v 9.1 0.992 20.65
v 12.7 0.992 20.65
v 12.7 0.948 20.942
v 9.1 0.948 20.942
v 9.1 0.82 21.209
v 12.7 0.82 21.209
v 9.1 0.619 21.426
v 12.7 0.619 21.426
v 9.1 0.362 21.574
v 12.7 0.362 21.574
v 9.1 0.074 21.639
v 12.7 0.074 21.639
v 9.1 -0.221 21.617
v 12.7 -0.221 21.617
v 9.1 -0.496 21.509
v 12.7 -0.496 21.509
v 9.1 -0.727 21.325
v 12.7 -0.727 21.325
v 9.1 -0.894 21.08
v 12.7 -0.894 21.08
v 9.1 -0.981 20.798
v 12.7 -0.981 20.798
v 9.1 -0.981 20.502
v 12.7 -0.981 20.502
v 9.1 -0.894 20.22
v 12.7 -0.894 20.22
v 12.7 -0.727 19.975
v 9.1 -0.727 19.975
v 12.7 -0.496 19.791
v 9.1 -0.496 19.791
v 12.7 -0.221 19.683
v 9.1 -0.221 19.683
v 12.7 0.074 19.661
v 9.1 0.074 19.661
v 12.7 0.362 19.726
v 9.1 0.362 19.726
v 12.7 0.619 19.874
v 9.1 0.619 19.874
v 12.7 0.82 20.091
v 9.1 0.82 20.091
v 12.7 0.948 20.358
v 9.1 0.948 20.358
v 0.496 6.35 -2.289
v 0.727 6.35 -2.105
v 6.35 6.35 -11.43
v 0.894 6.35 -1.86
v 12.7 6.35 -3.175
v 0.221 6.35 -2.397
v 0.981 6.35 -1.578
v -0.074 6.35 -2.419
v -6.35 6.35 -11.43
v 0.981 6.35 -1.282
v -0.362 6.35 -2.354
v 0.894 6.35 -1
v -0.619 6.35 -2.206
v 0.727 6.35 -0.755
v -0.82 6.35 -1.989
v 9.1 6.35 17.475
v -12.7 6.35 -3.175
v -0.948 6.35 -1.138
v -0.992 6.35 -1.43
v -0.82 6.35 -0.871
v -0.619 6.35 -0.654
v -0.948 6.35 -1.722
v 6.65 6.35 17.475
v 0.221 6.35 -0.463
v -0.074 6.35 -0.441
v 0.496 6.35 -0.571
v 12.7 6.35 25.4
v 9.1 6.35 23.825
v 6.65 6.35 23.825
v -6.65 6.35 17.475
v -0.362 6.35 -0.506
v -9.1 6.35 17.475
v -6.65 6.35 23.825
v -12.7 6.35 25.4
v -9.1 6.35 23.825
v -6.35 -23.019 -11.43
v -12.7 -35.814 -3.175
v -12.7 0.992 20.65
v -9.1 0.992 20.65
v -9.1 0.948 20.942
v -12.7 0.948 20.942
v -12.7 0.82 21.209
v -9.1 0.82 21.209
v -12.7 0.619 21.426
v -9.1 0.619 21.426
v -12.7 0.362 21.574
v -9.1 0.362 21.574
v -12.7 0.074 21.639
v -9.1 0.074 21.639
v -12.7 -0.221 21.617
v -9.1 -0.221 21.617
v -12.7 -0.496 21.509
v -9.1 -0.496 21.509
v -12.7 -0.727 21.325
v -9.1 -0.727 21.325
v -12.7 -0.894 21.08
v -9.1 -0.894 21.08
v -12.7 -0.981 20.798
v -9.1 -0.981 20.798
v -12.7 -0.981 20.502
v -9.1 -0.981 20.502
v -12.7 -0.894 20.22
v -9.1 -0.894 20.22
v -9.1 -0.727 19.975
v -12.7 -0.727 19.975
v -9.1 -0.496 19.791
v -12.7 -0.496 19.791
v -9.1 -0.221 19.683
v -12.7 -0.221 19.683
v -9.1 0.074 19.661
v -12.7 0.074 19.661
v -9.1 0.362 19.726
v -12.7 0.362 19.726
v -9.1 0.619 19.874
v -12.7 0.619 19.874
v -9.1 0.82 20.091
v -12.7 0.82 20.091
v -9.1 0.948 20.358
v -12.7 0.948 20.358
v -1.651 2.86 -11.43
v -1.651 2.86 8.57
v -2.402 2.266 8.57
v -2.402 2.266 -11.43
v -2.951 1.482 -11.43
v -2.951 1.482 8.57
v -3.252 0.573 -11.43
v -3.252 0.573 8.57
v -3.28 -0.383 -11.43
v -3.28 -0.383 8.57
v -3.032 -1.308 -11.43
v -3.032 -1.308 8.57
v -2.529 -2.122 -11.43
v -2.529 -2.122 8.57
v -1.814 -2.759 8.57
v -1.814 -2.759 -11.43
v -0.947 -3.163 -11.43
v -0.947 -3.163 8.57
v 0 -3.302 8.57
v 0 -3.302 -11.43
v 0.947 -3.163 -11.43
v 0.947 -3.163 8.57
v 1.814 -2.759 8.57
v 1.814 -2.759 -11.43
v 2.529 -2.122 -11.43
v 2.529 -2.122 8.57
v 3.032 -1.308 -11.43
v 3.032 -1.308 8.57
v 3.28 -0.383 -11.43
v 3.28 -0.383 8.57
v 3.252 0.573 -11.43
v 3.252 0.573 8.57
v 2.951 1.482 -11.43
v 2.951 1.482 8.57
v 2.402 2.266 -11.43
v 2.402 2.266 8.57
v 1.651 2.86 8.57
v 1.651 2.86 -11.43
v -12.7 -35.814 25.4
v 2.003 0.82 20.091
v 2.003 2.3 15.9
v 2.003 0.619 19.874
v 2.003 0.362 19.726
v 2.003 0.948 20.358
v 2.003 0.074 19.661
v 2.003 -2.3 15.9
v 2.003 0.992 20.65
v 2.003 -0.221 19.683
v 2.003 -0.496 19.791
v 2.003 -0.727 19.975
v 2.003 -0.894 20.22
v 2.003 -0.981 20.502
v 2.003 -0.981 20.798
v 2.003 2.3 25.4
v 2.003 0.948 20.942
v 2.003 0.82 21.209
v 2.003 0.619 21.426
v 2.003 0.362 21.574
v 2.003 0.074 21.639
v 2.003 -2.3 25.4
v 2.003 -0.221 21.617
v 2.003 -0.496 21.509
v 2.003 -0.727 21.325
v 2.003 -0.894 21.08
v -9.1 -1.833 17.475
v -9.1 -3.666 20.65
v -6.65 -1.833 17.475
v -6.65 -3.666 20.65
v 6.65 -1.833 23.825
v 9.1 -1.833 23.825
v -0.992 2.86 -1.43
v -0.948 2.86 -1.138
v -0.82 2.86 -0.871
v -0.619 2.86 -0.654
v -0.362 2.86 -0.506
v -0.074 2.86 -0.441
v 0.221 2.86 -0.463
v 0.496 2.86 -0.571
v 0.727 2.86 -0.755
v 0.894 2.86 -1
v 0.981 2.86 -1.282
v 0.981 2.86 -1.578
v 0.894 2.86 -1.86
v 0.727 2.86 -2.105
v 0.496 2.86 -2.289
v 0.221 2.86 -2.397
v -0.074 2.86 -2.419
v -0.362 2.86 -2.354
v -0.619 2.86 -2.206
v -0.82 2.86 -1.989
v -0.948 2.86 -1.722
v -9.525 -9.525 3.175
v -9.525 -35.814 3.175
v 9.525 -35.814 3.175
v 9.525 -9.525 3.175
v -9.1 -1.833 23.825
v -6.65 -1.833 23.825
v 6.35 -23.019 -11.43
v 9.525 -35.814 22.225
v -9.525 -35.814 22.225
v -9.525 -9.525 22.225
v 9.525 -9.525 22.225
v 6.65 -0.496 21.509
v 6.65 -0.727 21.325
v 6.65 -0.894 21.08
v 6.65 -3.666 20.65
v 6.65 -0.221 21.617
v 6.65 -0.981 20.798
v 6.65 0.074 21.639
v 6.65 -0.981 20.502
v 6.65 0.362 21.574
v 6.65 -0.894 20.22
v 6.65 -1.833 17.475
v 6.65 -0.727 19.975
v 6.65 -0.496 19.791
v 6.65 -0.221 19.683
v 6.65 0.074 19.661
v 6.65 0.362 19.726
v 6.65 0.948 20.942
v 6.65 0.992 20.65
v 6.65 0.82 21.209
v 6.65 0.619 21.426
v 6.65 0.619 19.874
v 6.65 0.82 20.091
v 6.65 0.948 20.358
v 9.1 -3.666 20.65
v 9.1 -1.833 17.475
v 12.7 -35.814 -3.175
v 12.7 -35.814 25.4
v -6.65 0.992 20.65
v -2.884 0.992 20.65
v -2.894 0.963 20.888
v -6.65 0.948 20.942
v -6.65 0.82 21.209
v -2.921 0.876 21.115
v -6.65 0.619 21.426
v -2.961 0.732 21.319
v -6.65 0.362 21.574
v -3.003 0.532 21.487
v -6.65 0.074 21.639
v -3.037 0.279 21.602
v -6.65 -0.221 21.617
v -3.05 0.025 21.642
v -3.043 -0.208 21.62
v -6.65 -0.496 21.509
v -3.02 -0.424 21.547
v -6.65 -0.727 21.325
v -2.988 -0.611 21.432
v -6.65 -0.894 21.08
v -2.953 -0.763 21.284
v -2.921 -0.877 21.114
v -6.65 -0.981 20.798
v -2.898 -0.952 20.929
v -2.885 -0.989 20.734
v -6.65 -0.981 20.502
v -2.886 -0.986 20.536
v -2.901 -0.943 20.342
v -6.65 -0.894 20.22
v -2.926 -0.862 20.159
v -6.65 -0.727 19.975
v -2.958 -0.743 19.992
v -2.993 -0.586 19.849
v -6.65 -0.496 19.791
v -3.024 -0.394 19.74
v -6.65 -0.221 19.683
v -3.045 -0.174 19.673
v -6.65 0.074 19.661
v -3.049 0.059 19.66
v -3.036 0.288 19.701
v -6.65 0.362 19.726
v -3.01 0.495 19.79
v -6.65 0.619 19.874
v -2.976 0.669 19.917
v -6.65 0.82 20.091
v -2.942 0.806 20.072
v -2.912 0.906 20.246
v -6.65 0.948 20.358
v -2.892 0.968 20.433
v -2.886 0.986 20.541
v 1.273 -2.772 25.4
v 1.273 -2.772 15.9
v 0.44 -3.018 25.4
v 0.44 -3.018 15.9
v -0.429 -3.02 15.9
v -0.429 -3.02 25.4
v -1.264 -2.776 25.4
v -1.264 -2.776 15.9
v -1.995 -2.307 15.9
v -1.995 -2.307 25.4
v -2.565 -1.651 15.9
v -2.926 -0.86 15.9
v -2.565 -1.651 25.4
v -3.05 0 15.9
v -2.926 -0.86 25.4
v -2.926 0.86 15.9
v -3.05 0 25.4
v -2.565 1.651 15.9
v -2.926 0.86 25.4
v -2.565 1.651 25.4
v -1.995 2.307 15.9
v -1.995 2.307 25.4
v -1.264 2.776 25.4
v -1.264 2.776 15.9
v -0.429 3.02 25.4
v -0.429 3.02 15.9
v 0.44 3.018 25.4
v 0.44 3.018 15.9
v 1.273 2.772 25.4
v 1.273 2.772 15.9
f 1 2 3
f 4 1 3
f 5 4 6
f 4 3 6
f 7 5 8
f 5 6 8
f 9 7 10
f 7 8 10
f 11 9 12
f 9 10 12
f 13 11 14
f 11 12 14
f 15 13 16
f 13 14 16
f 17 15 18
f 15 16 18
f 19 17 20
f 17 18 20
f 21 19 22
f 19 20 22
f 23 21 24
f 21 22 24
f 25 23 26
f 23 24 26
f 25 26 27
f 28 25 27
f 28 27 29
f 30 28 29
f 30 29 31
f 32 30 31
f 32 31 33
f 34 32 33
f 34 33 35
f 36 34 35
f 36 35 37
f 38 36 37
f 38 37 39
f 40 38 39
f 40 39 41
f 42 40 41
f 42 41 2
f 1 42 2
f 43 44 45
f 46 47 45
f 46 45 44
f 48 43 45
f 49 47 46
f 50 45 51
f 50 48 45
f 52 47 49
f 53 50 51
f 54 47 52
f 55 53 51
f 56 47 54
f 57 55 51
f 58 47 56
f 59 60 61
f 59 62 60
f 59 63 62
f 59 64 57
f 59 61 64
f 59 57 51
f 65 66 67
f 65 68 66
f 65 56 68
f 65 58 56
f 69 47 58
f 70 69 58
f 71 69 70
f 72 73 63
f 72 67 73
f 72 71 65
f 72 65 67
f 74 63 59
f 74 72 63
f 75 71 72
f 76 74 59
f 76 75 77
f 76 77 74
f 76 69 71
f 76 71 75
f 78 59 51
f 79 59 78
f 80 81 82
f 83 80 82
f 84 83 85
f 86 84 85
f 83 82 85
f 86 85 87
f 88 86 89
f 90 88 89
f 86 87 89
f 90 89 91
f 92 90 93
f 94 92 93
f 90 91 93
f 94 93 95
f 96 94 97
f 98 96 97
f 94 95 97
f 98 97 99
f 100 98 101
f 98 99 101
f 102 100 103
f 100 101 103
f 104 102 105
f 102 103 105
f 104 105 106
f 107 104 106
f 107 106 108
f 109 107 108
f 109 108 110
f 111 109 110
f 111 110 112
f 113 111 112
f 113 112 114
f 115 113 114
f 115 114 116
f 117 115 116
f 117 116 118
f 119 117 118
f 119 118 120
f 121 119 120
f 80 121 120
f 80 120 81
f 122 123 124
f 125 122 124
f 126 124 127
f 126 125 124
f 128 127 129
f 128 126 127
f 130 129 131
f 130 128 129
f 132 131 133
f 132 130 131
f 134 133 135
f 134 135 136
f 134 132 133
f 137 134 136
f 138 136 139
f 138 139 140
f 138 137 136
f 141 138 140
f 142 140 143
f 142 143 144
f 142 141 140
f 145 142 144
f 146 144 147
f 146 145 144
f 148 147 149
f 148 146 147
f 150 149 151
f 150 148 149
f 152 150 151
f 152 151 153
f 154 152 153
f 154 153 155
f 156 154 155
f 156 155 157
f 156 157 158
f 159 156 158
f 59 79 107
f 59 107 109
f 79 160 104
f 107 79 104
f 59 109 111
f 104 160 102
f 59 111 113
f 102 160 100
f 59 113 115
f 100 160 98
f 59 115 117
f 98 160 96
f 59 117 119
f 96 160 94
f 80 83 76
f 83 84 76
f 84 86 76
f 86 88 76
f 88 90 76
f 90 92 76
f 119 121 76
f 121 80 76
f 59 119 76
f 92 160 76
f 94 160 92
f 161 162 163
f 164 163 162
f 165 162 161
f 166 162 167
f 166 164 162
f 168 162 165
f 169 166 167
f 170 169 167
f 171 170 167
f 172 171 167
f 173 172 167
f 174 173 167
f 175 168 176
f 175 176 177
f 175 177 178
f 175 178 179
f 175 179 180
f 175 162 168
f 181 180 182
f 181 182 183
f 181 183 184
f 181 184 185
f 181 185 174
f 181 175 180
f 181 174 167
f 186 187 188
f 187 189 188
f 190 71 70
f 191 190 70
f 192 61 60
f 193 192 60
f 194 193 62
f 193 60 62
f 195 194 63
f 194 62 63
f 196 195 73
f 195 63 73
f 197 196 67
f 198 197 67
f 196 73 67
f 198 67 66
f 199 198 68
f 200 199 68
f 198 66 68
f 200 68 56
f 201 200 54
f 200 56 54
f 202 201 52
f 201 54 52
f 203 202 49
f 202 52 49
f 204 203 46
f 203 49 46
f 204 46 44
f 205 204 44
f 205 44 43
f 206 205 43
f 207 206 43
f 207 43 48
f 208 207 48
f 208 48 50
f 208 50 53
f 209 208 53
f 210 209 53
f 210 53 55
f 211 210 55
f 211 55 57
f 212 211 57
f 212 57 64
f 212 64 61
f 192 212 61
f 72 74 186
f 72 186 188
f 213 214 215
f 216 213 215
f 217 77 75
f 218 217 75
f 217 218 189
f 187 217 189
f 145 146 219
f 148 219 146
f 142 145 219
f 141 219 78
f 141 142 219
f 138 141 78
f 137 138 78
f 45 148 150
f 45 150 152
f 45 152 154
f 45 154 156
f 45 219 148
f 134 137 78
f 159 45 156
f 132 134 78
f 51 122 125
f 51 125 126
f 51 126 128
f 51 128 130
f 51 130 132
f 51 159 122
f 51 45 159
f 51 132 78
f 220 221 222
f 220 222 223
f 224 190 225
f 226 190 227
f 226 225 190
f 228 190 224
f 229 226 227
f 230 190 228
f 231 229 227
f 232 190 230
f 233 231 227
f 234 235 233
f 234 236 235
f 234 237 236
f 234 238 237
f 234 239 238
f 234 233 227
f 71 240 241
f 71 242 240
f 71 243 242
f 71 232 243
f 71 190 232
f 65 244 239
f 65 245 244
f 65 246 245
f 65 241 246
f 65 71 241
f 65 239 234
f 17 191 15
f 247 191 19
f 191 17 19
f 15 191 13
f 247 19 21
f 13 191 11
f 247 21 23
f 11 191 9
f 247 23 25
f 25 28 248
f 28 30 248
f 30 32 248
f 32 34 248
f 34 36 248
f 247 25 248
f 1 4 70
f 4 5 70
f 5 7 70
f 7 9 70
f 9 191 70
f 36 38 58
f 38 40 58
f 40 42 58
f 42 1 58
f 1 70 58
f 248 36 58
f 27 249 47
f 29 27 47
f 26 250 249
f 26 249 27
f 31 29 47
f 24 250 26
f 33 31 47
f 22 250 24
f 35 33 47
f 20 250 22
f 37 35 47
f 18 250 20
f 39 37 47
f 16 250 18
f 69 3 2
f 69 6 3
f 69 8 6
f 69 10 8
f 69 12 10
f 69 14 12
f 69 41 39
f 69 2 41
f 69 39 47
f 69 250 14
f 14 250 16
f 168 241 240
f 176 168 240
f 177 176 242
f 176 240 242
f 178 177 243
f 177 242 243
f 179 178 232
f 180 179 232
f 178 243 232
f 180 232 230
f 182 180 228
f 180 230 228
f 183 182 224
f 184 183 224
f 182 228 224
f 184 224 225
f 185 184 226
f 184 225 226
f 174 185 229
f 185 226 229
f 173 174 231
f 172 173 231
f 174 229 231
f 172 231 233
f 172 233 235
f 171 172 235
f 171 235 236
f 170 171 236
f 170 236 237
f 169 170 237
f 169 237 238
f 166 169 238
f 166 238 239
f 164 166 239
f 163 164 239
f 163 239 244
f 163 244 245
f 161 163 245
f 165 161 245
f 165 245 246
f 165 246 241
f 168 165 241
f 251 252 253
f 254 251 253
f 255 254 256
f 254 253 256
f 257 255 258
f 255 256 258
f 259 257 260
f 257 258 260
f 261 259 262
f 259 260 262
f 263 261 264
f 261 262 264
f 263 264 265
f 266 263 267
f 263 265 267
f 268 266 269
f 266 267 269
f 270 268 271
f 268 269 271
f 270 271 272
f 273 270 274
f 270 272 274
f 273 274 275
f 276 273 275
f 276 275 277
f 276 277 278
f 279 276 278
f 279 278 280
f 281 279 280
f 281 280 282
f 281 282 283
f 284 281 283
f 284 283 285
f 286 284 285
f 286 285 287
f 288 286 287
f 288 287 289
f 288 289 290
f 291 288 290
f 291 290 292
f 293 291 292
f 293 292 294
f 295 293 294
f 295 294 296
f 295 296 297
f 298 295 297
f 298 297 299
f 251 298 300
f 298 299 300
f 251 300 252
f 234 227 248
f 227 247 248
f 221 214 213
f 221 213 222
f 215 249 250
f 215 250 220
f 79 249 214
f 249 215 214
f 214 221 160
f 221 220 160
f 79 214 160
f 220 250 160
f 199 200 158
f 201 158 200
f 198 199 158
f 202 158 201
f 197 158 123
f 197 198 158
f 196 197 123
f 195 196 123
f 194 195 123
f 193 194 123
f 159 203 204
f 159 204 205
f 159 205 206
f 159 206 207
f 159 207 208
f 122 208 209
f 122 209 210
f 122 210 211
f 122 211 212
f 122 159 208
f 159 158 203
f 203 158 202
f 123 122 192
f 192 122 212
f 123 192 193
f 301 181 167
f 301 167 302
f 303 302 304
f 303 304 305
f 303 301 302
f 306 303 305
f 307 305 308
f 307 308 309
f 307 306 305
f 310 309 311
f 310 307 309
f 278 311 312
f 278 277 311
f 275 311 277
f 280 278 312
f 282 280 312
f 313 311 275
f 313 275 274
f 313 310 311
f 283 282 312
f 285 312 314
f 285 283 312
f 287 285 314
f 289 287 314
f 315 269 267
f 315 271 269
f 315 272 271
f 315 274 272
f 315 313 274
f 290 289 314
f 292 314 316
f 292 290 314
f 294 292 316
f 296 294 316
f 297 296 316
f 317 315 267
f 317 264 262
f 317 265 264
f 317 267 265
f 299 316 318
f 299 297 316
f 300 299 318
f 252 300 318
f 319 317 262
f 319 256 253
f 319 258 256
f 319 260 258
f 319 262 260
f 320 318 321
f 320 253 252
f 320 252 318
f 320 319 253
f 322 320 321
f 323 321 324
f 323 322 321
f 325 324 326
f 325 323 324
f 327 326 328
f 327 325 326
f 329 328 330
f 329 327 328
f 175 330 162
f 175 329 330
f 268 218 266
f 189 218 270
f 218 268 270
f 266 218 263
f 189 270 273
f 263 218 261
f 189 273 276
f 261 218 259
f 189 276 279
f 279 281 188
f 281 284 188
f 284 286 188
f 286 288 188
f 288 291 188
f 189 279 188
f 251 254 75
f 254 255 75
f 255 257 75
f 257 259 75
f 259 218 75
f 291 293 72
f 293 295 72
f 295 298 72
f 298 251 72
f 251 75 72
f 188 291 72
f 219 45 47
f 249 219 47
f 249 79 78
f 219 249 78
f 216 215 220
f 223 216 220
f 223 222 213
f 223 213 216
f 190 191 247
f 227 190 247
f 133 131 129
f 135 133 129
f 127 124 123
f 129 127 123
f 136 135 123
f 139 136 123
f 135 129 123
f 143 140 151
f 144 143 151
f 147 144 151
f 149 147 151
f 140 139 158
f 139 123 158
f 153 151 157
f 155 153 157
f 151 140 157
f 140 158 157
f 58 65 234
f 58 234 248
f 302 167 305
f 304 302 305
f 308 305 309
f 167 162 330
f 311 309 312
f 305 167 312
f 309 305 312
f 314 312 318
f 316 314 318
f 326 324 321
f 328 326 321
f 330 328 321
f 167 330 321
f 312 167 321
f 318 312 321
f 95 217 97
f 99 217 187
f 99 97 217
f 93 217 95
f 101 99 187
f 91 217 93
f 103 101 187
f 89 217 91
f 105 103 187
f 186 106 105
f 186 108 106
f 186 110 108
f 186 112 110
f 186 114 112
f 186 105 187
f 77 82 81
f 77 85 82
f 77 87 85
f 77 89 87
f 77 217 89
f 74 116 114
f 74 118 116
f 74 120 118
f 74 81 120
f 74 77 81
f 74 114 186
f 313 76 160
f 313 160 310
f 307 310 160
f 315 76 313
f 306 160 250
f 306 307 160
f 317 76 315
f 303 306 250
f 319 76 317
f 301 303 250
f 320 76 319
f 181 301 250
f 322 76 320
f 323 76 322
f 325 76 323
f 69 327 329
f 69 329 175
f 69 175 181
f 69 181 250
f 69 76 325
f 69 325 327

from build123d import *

# Parameters (mm, degrees)
BOSS_EXTRUDE1_DEPTH = 25.4
CUT_EXTRUDE1_DEPTH  = 9.5
SKETCH5_W           = 25.4
SKETCH5_H           = 42.164
BOSS_EXTRUDE2_DEPTH = 11.43
CUT_EXTRUDE2_REACH  = 53.538
CUT_EXTRUDE3_REACH  = 53.255
CUT_EXTRUDE4_DEPTH  = 20
SKETCH10_W          = 19.05
SKETCH10_H          = 19.05
CUT_EXTRUDE5_DEPTH  = 26.289
CUT_EXTRUDE6_REACH  = 55.322
SKETCH11_W          = 1.5875
SKETCH11_H          = 12.7
SKETCH12_R          = 0.9921875
CUT_EXTRUDE7_DEPTH  = 51.724378715
CUT_EXTRUDE8_REACH  = 52.836
SKETCH13_R          = 0.9921875
CUT_EXTRUDE9_START  = -7.875
CUT_EXTRUDE9_DEPTH  = 1.225
CUT_EXTRUDE10_START = 7.875
CUT_EXTRUDE10_DEPTH = 1.225
CUT_EXTRUDE11_REACH = 52.836
SKETCH15_W          = 2.45
SKETCH15_H          = 6.35


with BuildPart() as part:
    # Sketch2 → Boss-Extrude1 (new body)
    with BuildSketch(Plane.XY):
        Polygon((12.7, -6.35), (14.2875, -6.35), (14.2875, 6.35), (-14.2875, 6.35), (-14.2875, -6.35), (-12.7, -6.35), (-12.7, -35.814), (12.7, -35.814), align=None)
    extrude(amount=BOSS_EXTRUDE1_DEPTH)

    # Sketch3 → Cut-Extrude1 (cut)
    with BuildSketch(Plane.XY.offset(25.4)):
        with BuildLine():
            Line((2.003122562, 2.3), (2.003122562, -2.3))
            ThreePointArc((2.003122562, -2.3), (-3.05, 0), (2.003122562, 2.3))
        make_face()
    extrude(amount=-CUT_EXTRUDE1_DEPTH, mode=Mode.SUBTRACT)

    # Sketch5 → Boss-Extrude2 (add)
    with BuildSketch(Plane(origin=(0, 0, 0), x_dir=(-1, 0, 0), z_dir=(0, 0, -1))):
        with Locations((0, -14.732)):
            Rectangle(SKETCH5_W, SKETCH5_H)
    extrude(amount=BOSS_EXTRUDE2_DEPTH)

    # Sketch6 → Cut-Extrude2 (cut, up to next)
    with BuildSketch(Plane(origin=(12.7, 0, 0), x_dir=(0, 0, -1), z_dir=(1, 0, 0)), mode=Mode.PRIVATE) as cut_extrude2_sk1:
        Polygon((3.175, -35.814), (11.43, -23.01875), (11.43, -35.814), align=None)
    cut_extrude2_tool1 = extrude(cut_extrude2_sk1.sketch, amount=-CUT_EXTRUDE2_REACH, mode=Mode.PRIVATE) & part.part
    add(cut_extrude2_tool1.solids().sort_by_distance((12.7, -31.548917, -8.678333))[0], mode=Mode.SUBTRACT)

    # Sketch7 → Cut-Extrude3 (cut, up to next)
    with BuildSketch(Plane.XZ.offset(35.814), mode=Mode.PRIVATE) as cut_extrude3_sk1:
        Polygon((-12.7, -11.43), (-12.7, -3.175), (-6.35, -11.43), align=None)
    cut_extrude3_tool1 = extrude(cut_extrude3_sk1.sketch, amount=-CUT_EXTRUDE3_REACH, mode=Mode.PRIVATE) & part.part
    # Sketch7 → Cut-Extrude3 (cut, up to next)
    with BuildSketch(Plane.XZ.offset(35.814), mode=Mode.PRIVATE) as cut_extrude3_sk2:
        Polygon((6.35, -11.43), (12.7, -3.175), (12.7, -11.43), align=None)
    cut_extrude3_tool2 = extrude(cut_extrude3_sk2.sketch, amount=-CUT_EXTRUDE3_REACH, mode=Mode.PRIVATE) & part.part
    add(cut_extrude3_tool1.solids().sort_by_distance((-10.583333, -35.814, -8.678333))[0], mode=Mode.SUBTRACT)
    add(cut_extrude3_tool2.solids().sort_by_distance((10.583333, -35.814, -8.678333))[0], mode=Mode.SUBTRACT)

    # Sketch8 → Cut-Extrude4 (cut)
    with BuildSketch(Plane(origin=(0, 0, -11.43), x_dir=(-1, 0, 0), z_dir=(0, 0, -1))):
        with BuildLine():
            Line((-1.651, 2.859615883), (1.651, 2.859615883))
            ThreePointArc((1.651, 2.859615883), (0, -3.302), (-1.651, 2.859615883))
        make_face()
    extrude(amount=-CUT_EXTRUDE4_DEPTH, mode=Mode.SUBTRACT)

    # Sketch10 → Cut-Extrude5 (cut)
    with BuildSketch(Plane.XZ.offset(35.814)):
        with Locations((0, 12.7)):
            Rectangle(SKETCH10_W, SKETCH10_H)
    extrude(amount=-CUT_EXTRUDE5_DEPTH, mode=Mode.SUBTRACT)

    # Sketch11 → Cut-Extrude6 (cut, up to next)
    with BuildSketch(Plane.XY.offset(25.4), mode=Mode.PRIVATE) as cut_extrude6_sk1:
        with Locations((-13.49375, 0)):
            Rectangle(SKETCH11_W, SKETCH11_H)
    cut_extrude6_tool1 = extrude(cut_extrude6_sk1.sketch, amount=-CUT_EXTRUDE6_REACH, mode=Mode.PRIVATE) & part.part
    # Sketch11 → Cut-Extrude6 (cut, up to next)
    with BuildSketch(Plane.XY.offset(25.4), mode=Mode.PRIVATE) as cut_extrude6_sk2:
        with Locations((13.49375, 0)):
            Rectangle(SKETCH11_W, SKETCH11_H)
    cut_extrude6_tool2 = extrude(cut_extrude6_sk2.sketch, amount=-CUT_EXTRUDE6_REACH, mode=Mode.PRIVATE) & part.part
    add(cut_extrude6_tool1.solids().sort_by_distance((-13.49375, 0, 25.4))[0], mode=Mode.SUBTRACT)
    add(cut_extrude6_tool2.solids().sort_by_distance((13.49375, 0, 25.4))[0], mode=Mode.SUBTRACT)

    # Sketch12 → Cut-Extrude7 (cut, through all)
    with BuildSketch(Plane(origin=(12.7, 0, 0), x_dir=(0, 0, -1), z_dir=(1, 0, 0))):
        with Locations(Location((-20.65, 0, 0), (0, 0, 90))):
            Circle(SKETCH12_R)
    extrude(amount=-CUT_EXTRUDE7_DEPTH, mode=Mode.SUBTRACT)

    # Sketch13 → Cut-Extrude8 (cut, up to next)
    with BuildSketch(Plane(origin=(0, 6.35, 0), x_dir=(1, 0, 0), z_dir=(0, 1, 0)), mode=Mode.PRIVATE) as cut_extrude8_sk1:
        with Locations(Location((0, 1.43, 0), (0, 0, 180))):
            Circle(SKETCH13_R)
    cut_extrude8_tool1 = extrude(cut_extrude8_sk1.sketch, amount=-CUT_EXTRUDE8_REACH, mode=Mode.PRIVATE) & part.part
    add(cut_extrude8_tool1.solids().sort_by_distance((0, 6.35, -1.43))[0], mode=Mode.SUBTRACT)

    # Sketch14 → Cut-Extrude9 (cut, symmetric)
    with BuildSketch(Plane(origin=(0, 0, 0), x_dir=(0, 0, -1), z_dir=(1, 0, 0)).offset(CUT_EXTRUDE9_START)):
        Polygon((-17.475, 1.833087105), (-20.65, 3.666174209), (-23.825, 1.833087105), (-23.825, -1.833087105), (-20.65, -3.666174209), (-17.475, -1.833087105), align=None)
    extrude(amount=CUT_EXTRUDE9_DEPTH, both=True, mode=Mode.SUBTRACT)

    # Sketch14<2> → Cut-Extrude10 (cut, symmetric)
    with BuildSketch(Plane(origin=(0, 0, 0), x_dir=(0, 0, -1), z_dir=(1, 0, 0)).offset(CUT_EXTRUDE10_START)):
        Polygon((-17.475, 1.833087105), (-20.65, 3.666174209), (-23.825, 1.833087105), (-23.825, -1.833087105), (-20.65, -3.666174209), (-17.475, -1.833087105), align=None)
    extrude(amount=CUT_EXTRUDE10_DEPTH, both=True, mode=Mode.SUBTRACT)

    # Sketch15 → Cut-Extrude11 (cut, up to next)
    with BuildSketch(Plane(origin=(0, 6.35, 0), x_dir=(1, 0, 0), z_dir=(0, 1, 0)), mode=Mode.PRIVATE) as cut_extrude11_sk1:
        with Locations((-7.875, -20.65)):
            Rectangle(SKETCH15_W, SKETCH15_H)
    cut_extrude11_tool1 = extrude(cut_extrude11_sk1.sketch, amount=-CUT_EXTRUDE11_REACH, mode=Mode.PRIVATE) & part.part
    # Sketch15 → Cut-Extrude11 (cut, up to next)
    with BuildSketch(Plane(origin=(0, 6.35, 0), x_dir=(1, 0, 0), z_dir=(0, 1, 0)), mode=Mode.PRIVATE) as cut_extrude11_sk2:
        with Locations((7.875, -20.65)):
            Rectangle(SKETCH15_W, SKETCH15_H)
    cut_extrude11_tool2 = extrude(cut_extrude11_sk2.sketch, amount=-CUT_EXTRUDE11_REACH, mode=Mode.PRIVATE) & part.part
    add(cut_extrude11_tool1.solids().sort_by_distance((-7.875, 6.35, 20.65))[0], mode=Mode.SUBTRACT)
    add(cut_extrude11_tool2.solids().sort_by_distance((7.875, 6.35, 20.65))[0], mode=Mode.SUBTRACT)


solid = part.part
